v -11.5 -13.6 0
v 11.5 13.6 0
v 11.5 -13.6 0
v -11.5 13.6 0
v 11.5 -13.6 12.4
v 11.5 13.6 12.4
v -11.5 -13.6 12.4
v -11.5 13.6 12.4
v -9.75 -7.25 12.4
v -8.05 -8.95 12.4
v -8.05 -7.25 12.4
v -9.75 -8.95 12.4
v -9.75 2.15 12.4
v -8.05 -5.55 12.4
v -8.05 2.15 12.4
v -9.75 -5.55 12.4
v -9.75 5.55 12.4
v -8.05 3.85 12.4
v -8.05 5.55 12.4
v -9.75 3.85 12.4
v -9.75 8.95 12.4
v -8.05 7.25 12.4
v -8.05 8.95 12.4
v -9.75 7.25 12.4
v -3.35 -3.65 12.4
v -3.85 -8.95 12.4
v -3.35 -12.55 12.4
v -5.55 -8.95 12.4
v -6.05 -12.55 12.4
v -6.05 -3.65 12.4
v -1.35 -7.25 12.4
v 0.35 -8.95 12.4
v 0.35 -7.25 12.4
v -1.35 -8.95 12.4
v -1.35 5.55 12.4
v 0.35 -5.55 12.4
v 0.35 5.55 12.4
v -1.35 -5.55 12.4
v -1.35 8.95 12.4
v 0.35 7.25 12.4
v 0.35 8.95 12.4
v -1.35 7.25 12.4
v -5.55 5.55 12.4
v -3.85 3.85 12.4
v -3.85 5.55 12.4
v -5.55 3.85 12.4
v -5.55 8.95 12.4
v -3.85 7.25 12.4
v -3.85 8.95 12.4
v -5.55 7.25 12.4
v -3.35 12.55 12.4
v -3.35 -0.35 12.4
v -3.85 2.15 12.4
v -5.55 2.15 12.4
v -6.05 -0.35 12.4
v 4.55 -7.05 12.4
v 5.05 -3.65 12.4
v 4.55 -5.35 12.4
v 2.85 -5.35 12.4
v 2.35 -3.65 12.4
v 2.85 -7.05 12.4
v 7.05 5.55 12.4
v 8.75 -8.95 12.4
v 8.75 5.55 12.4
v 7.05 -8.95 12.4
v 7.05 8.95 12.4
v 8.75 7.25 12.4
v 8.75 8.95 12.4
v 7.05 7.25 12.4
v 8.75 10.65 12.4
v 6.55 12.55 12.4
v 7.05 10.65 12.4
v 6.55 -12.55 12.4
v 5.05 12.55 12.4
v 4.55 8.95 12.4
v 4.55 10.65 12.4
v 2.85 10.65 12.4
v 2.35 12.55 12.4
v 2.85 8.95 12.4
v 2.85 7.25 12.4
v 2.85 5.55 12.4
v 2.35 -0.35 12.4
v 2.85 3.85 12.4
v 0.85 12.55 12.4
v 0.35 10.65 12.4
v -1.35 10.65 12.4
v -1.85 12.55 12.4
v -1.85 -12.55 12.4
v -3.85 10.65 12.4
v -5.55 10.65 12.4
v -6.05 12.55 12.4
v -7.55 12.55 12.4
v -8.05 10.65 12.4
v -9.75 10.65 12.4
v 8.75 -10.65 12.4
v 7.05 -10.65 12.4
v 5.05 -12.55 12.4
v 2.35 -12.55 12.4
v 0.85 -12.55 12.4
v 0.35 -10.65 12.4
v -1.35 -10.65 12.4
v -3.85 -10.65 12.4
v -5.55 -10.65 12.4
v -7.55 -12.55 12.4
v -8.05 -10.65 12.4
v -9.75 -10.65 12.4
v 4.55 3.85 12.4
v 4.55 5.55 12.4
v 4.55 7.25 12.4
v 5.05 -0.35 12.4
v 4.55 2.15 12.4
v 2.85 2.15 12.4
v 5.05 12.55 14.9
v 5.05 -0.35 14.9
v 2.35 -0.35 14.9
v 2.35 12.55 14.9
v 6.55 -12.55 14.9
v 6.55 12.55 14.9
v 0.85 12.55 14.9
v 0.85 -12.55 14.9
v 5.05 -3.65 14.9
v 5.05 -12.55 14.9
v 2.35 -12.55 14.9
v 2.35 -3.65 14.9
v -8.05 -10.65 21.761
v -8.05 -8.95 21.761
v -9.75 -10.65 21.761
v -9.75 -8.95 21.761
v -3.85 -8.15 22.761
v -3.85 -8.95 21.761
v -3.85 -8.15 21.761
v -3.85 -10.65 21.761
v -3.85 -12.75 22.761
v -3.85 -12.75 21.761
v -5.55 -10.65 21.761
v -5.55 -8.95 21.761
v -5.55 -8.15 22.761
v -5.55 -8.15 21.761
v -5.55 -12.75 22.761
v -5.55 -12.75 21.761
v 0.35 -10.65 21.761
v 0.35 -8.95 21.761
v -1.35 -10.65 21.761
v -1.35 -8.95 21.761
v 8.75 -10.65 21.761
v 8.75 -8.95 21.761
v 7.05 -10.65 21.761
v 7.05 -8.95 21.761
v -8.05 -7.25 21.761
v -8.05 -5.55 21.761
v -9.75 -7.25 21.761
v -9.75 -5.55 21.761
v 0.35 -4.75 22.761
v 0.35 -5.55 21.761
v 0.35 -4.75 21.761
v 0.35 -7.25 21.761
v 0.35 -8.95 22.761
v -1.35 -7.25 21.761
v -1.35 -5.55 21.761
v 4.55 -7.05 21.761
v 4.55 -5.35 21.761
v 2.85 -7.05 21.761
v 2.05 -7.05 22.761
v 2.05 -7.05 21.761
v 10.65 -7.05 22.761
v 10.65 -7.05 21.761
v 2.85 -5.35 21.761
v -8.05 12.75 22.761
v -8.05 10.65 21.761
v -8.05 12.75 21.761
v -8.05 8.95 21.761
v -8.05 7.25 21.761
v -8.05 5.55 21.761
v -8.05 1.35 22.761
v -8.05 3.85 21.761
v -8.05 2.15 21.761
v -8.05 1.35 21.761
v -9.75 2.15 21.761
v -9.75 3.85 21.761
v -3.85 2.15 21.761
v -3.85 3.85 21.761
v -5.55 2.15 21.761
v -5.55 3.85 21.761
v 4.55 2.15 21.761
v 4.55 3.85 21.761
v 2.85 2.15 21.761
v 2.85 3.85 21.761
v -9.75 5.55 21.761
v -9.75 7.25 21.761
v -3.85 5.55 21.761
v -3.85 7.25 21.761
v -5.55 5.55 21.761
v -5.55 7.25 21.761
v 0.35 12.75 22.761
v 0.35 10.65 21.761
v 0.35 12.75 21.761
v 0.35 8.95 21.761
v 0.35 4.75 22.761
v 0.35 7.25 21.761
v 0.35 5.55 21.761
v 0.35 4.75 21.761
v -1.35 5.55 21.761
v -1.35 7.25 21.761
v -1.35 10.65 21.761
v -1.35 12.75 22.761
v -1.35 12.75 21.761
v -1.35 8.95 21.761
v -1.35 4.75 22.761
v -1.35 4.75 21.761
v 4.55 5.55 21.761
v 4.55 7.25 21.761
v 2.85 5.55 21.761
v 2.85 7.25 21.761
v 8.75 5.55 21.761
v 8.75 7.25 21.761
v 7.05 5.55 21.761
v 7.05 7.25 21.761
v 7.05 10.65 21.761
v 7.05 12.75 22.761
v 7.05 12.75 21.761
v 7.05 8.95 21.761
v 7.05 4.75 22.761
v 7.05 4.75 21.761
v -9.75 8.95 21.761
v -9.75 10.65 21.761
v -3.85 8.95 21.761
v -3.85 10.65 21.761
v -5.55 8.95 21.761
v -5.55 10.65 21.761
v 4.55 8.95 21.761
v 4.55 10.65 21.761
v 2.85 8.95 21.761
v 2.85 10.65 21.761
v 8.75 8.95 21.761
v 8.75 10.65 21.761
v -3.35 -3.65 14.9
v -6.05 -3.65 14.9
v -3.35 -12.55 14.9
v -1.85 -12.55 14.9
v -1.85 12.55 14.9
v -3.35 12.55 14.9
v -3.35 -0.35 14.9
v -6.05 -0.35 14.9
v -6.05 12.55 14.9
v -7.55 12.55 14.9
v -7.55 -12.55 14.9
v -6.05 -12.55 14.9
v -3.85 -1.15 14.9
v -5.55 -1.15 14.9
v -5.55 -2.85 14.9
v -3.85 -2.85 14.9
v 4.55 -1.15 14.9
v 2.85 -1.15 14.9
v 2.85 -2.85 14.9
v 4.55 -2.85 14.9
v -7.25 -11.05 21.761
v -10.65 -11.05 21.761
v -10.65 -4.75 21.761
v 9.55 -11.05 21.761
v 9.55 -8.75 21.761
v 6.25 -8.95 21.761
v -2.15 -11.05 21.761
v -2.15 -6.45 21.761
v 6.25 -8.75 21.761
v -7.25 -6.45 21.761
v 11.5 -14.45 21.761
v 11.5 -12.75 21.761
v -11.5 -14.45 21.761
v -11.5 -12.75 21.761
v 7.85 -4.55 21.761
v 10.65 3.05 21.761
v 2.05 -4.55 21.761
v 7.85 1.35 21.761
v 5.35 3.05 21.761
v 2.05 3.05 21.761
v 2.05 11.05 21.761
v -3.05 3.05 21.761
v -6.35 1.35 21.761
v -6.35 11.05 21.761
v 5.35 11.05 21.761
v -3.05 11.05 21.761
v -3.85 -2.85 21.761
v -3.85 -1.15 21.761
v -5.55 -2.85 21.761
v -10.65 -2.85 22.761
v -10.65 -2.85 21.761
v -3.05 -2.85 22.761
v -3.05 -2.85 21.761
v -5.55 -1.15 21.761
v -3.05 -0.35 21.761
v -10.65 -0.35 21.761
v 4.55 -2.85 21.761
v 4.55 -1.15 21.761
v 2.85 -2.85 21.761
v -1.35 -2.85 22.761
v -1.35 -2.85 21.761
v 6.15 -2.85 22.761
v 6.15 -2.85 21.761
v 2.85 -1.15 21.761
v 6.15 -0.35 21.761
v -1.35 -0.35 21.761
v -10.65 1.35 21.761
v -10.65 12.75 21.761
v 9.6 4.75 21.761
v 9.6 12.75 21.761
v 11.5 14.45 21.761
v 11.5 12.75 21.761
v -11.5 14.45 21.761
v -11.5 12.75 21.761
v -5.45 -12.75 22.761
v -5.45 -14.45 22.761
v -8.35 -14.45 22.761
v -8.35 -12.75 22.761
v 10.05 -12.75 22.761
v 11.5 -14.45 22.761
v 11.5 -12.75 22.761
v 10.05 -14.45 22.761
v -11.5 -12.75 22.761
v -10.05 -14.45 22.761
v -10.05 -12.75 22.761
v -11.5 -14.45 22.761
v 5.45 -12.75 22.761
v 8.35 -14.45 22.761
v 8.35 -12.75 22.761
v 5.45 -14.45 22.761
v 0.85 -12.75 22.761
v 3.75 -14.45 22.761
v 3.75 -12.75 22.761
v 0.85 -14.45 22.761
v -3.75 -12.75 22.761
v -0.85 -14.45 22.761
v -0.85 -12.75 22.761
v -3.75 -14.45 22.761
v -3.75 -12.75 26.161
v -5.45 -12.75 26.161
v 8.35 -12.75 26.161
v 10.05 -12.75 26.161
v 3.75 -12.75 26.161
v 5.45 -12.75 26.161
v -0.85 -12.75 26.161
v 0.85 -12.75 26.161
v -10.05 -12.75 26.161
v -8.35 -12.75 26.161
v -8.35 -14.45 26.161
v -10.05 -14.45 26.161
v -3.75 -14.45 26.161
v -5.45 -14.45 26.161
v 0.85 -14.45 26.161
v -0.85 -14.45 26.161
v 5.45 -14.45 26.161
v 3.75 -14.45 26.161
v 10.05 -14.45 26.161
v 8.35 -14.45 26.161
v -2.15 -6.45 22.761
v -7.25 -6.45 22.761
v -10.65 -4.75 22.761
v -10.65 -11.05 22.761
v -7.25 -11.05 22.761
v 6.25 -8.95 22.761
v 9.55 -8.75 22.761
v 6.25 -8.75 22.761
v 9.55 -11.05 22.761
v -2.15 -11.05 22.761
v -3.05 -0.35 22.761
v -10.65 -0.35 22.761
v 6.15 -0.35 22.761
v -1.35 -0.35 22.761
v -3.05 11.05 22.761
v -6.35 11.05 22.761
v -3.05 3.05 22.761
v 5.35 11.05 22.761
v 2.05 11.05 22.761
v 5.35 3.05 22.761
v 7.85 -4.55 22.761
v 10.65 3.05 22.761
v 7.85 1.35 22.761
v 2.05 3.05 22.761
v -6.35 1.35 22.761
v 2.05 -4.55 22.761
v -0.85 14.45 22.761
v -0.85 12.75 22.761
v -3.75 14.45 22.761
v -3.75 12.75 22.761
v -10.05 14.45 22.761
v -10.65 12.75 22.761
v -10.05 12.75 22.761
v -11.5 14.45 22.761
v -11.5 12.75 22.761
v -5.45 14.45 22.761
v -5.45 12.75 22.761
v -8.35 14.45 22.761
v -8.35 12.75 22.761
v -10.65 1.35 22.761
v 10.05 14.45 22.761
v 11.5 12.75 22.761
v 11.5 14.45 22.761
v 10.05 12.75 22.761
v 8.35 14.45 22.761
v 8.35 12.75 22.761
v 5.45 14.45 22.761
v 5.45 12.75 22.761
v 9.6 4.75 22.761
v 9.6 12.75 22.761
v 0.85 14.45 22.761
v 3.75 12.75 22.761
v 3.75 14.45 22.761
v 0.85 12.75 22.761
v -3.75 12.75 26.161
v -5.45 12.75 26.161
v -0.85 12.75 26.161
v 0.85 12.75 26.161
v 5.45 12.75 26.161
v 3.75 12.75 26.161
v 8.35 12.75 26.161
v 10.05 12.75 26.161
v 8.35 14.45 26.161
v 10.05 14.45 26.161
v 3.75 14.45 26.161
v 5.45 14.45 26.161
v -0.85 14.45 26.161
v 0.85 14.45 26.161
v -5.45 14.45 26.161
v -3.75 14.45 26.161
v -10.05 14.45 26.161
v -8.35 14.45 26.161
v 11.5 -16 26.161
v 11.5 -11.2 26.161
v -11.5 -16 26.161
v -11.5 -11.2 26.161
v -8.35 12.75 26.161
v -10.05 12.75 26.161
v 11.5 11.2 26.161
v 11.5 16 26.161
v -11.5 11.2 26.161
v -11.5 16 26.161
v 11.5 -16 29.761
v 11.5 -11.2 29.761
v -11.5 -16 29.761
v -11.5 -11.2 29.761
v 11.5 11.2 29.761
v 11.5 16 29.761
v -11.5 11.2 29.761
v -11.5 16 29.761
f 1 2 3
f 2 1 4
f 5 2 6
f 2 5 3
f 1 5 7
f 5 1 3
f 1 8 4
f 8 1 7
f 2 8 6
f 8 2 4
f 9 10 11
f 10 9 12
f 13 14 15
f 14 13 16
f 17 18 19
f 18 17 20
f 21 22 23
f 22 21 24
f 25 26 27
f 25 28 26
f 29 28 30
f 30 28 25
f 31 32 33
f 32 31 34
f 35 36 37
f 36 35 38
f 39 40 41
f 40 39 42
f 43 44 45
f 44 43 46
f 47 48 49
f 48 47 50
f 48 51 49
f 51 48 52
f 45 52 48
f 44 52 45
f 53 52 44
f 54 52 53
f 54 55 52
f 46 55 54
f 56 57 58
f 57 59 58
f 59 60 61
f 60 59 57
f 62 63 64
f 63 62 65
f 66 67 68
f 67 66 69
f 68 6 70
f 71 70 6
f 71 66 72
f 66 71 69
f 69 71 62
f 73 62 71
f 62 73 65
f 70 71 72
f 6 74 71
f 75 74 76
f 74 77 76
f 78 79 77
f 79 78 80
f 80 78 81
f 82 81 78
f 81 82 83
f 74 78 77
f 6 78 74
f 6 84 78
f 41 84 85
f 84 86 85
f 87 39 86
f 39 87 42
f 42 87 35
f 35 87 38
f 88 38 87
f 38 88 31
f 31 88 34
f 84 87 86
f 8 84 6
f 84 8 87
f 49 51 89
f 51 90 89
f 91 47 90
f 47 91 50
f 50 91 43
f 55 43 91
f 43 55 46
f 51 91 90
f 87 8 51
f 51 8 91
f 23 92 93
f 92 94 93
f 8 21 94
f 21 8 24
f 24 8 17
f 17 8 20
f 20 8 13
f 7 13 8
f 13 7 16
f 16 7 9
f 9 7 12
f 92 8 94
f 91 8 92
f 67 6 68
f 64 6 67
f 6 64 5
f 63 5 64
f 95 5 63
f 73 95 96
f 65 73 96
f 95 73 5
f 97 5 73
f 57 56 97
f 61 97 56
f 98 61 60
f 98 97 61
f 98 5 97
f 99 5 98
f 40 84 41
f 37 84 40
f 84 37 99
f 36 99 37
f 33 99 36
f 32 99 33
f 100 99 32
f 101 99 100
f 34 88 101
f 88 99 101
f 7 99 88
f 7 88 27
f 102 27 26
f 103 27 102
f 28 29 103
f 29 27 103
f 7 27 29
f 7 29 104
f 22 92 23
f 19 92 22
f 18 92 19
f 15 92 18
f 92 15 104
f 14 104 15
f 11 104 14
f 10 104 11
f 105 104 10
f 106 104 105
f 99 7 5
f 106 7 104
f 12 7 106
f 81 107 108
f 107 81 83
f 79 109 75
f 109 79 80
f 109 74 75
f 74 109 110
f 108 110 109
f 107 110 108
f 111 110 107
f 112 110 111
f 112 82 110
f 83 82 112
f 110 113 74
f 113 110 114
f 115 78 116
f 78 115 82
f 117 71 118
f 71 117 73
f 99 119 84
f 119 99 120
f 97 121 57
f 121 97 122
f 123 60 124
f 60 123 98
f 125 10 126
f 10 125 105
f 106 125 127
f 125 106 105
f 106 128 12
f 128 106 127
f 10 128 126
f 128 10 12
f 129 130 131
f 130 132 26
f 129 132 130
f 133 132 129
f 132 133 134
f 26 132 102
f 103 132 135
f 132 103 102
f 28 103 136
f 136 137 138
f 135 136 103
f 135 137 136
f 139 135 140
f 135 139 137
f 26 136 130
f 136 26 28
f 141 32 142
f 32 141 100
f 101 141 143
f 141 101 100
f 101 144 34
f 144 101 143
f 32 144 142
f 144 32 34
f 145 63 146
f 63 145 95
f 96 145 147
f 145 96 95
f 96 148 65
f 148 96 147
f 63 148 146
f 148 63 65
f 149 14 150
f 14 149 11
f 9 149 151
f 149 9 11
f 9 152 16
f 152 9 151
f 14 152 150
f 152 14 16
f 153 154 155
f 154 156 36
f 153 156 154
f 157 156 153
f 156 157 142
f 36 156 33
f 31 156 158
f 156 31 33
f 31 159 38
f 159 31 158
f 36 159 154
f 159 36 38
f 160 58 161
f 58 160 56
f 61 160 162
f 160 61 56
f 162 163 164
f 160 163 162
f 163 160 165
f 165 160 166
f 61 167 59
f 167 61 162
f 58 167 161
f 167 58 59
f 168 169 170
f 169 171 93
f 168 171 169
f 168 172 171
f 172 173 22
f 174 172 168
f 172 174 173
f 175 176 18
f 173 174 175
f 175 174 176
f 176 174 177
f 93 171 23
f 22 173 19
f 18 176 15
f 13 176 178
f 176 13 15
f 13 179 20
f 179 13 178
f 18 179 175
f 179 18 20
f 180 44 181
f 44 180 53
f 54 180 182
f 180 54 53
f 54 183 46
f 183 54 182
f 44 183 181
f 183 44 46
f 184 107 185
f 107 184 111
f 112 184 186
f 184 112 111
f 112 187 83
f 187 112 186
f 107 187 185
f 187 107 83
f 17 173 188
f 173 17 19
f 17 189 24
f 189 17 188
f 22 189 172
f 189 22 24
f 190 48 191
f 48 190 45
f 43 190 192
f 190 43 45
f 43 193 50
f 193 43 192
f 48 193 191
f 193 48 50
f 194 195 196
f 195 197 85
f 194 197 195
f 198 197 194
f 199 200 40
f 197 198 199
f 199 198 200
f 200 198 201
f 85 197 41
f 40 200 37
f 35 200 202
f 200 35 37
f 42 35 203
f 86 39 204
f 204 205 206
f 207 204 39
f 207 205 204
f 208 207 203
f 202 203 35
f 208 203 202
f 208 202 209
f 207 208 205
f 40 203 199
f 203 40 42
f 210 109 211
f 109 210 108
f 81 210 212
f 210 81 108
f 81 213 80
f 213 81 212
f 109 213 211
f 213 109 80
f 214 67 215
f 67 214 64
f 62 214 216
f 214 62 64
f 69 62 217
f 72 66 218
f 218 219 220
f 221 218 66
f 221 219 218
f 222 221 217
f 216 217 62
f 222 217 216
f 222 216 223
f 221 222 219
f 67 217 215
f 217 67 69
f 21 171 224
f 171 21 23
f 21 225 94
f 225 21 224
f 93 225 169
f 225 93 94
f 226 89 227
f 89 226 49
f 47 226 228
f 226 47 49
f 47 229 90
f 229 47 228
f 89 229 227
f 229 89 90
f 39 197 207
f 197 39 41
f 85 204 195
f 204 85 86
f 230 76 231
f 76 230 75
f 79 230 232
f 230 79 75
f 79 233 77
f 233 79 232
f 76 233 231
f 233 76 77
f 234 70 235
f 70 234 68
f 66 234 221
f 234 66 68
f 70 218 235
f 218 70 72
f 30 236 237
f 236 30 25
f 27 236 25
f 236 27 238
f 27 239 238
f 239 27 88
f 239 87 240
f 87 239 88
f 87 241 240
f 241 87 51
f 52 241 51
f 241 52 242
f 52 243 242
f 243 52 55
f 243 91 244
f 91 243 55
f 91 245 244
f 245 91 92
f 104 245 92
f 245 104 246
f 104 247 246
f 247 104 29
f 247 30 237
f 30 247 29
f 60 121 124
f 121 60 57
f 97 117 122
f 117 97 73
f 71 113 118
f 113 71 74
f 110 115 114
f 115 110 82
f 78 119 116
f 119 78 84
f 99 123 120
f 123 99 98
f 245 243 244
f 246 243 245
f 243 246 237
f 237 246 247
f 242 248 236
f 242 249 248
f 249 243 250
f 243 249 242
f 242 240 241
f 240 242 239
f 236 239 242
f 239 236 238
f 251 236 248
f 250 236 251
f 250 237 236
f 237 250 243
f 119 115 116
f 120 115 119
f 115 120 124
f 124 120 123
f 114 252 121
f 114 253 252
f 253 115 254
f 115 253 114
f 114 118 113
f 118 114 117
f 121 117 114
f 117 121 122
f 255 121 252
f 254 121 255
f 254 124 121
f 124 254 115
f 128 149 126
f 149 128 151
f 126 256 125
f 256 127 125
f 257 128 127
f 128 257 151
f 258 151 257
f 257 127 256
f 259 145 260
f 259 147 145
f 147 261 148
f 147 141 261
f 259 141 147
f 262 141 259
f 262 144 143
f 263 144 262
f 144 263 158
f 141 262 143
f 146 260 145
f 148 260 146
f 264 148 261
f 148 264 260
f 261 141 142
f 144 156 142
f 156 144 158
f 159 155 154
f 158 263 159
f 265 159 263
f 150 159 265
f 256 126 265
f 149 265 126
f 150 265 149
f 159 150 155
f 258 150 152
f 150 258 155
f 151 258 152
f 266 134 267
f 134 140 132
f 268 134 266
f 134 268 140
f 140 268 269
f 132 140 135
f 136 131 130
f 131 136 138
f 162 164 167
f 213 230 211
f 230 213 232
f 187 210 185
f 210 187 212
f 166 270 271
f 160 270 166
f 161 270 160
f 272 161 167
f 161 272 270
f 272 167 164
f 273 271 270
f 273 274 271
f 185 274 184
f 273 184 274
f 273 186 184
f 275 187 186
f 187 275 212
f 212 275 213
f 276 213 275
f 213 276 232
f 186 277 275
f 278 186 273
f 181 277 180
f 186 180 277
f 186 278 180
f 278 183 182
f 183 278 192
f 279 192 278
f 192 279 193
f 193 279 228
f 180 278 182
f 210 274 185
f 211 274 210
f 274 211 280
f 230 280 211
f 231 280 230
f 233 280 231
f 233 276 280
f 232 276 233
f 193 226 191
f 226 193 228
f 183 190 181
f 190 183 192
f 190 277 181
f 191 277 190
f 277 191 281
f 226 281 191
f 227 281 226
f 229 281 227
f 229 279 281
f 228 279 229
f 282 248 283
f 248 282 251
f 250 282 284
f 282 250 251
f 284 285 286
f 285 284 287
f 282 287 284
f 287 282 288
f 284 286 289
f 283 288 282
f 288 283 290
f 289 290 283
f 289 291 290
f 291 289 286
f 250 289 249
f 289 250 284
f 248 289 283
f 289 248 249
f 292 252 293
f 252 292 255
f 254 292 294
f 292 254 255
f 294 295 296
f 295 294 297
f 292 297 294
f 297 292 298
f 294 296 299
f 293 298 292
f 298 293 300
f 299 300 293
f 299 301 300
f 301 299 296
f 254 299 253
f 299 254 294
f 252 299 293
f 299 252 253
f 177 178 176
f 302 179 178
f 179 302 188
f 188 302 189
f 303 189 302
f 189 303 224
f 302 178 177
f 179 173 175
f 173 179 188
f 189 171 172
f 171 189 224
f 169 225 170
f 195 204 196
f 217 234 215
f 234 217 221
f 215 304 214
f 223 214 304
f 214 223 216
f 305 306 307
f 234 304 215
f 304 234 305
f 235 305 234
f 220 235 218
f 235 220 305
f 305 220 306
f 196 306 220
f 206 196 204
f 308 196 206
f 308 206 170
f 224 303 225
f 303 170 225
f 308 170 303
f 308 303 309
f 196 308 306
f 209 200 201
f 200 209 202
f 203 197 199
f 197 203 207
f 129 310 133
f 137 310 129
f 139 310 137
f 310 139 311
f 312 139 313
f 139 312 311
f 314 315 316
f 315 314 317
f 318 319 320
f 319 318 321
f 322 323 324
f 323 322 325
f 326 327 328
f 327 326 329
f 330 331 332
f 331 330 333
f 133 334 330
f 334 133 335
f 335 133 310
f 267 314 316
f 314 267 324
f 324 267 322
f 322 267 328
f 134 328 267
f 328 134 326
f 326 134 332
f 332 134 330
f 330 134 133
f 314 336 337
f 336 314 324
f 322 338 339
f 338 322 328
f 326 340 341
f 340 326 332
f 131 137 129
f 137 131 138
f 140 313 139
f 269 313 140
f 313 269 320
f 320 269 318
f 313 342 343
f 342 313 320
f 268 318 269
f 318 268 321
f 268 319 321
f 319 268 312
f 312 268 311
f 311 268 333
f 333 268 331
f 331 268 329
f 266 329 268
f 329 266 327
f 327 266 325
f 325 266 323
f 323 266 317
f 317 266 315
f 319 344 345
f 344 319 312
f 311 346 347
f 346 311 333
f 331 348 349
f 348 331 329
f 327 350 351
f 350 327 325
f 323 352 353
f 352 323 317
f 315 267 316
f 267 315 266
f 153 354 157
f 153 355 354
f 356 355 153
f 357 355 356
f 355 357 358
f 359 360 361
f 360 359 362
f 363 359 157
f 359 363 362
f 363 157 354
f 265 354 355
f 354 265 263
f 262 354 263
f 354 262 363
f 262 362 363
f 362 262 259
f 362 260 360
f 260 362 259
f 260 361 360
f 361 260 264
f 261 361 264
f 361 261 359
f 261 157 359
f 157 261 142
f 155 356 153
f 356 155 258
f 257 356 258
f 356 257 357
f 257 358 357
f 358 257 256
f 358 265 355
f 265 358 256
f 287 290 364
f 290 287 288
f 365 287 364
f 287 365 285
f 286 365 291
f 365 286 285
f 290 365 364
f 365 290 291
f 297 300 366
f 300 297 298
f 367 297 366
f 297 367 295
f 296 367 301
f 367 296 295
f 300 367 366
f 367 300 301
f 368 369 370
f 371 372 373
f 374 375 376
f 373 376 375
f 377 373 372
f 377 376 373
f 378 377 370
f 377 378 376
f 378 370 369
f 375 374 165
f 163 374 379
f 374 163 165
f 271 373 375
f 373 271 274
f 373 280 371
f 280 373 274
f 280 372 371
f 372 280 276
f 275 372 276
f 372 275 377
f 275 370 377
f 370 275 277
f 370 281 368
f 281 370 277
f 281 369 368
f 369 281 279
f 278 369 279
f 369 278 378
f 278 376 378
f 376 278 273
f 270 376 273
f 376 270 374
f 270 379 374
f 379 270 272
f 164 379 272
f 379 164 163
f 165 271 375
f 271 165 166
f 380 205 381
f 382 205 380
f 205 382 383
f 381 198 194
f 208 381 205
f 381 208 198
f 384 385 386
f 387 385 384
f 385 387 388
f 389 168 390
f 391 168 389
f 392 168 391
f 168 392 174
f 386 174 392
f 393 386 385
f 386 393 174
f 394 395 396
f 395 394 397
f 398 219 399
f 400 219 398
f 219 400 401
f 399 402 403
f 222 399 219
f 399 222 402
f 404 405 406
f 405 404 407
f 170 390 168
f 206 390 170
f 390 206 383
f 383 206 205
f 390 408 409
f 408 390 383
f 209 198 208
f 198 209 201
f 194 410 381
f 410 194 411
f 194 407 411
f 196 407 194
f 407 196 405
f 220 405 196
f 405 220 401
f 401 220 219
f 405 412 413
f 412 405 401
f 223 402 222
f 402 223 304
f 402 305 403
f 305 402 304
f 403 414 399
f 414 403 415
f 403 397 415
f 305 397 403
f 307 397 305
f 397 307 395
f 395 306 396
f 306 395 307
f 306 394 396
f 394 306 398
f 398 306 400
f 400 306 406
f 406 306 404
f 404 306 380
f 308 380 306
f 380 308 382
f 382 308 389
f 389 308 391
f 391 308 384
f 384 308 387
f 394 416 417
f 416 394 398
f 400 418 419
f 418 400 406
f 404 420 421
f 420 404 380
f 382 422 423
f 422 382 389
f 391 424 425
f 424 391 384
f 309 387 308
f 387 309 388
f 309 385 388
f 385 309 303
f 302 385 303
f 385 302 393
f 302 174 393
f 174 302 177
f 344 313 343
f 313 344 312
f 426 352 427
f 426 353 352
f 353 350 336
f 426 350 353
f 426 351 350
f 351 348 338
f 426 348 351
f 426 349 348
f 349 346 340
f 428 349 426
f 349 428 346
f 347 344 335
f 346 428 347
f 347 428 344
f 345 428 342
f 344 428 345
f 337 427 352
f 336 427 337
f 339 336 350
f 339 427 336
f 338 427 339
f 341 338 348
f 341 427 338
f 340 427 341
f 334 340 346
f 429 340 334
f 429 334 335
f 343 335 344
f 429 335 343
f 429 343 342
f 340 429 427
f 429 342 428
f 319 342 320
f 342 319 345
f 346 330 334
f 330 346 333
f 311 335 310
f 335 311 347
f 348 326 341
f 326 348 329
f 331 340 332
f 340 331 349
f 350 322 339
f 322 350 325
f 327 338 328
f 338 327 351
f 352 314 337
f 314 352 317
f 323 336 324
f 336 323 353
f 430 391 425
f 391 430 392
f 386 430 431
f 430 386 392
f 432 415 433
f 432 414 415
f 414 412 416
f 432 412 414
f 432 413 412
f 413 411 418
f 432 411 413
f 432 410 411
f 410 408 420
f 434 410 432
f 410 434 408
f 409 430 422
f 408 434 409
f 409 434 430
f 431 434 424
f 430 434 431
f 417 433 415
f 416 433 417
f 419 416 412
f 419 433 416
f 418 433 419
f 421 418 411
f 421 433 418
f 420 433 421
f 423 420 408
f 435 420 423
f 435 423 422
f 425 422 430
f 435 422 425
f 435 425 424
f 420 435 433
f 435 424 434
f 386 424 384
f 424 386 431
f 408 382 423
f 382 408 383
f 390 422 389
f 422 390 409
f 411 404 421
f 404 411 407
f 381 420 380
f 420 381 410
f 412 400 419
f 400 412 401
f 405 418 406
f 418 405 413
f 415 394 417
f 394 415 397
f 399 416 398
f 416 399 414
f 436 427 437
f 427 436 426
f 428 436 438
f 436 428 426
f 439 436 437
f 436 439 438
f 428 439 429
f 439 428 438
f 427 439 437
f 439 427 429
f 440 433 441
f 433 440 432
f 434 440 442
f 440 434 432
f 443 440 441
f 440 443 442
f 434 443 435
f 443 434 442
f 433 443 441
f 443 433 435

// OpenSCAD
// Generated by SolidPython 0.4.2 on 2020-09-29 23:21:22
//!OpenSCAD

scale(v = 0.0100000000) {
	translate(v = [-1150, -1360, 0]) {
		union() {
			color(c = [0.4000000000, 0.4000000000, 0.4000000000]) {
				translate(v = [0, 0, 0]) {
					linear_extrude(height = 1000.0000000000) {
						polygon(paths = [[0, 1, 2, 3]], points = [[0, 0], [0, 2720], [2300, 2720], [2300, 0]]);
					}
				}
			}
			color(c = [0.2000000000, 0.6000000000, 0.2000000000]) {
				translate(v = [0, 0, 1000.0000000000]) {
					linear_extrude(height = 120.0000000000) {
						polygon(paths = [[0, 1, 2, 3]], points = [[0, 1305], [0, 2720], [2300, 2720], [2300, 1305]]);
					}
				}
			}
			color(c = [0.4000000000, 0.4000000000, 0.4000000000]) {
				translate(v = [0, 0, 1000.0000000000]) {
					linear_extrude(height = 120.0000000000) {
						polygon(paths = [[0, 1, 2, 3]], points = [[0, 0], [0, 1305], [2300, 1305], [2300, 0]]);
					}
				}
			}
			color(c = [0.9000000000, 0.6000000000, 0.6000000000]) {
				translate(v = [0, 0, 1120.0000000000]) {
					linear_extrude(height = 120.0000000000) {
						polygon(paths = [[0, 1, 2, 3]], points = [[135, 1485], [135, 2485], [395, 2485], [395, 1485]]);
					}
				}
			}
			color(c = [0.9000000000, 0.6000000000, 0.6000000000]) {
				translate(v = [0, 0, 1120.0000000000]) {
					linear_extrude(height = 120.0000000000) {
						polygon(paths = [[0, 1, 2, 3]], points = [[545, 1485], [545, 2485], [815, 2485], [815, 1485]]);
					}
				}
			}
			color(c = [0.9000000000, 0.6000000000, 0.6000000000]) {
				translate(v = [0, 0, 1120.0000000000]) {
					linear_extrude(height = 120.0000000000) {
						polygon(paths = [[0, 1, 2, 3]], points = [[965, 1485], [965, 2485], [1235, 2485], [1235, 1485]]);
					}
				}
			}
			color(c = [0.9000000000, 0.6000000000, 0.6000000000]) {
				translate(v = [0, 0, 1120.0000000000]) {
					linear_extrude(height = 120.0000000000) {
						polygon(paths = [[0, 1, 2, 3]], points = [[1385, 1485], [1385, 2485], [1655, 2485], [1655, 1485]]);
					}
				}
			}
			color(c = [0.9000000000, 0.6000000000, 0.6000000000]) {
				translate(v = [0, 0, 1120.0000000000]) {
					linear_extrude(height = 120.0000000000) {
						polygon(paths = [[0, 1, 2, 3]], points = [[1805, 1485], [1805, 2485], [2065, 2485], [2065, 1485]]);
					}
				}
			}
			color(c = [0.9000000000, 0.6000000000, 0.9000000000]) {
				translate(v = [0, 0, 1120.0000000000]) {
					linear_extrude(height = 120.0000000000) {
						polygon(paths = [[0, 1, 2, 3]], points = [[135, 235], [135, 885], [395, 885], [395, 235]]);
					}
				}
			}
			color(c = [0.9000000000, 0.6000000000, 0.9000000000]) {
				translate(v = [0, 0, 1120.0000000000]) {
					linear_extrude(height = 120.0000000000) {
						polygon(paths = [[0, 1, 2, 3]], points = [[545, 235], [545, 885], [815, 885], [815, 235]]);
					}
				}
			}
			color(c = [0.9000000000, 0.6000000000, 0.9000000000]) {
				translate(v = [0, 0, 1120.0000000000]) {
					linear_extrude(height = 120.0000000000) {
						polygon(paths = [[0, 1, 2, 3]], points = [[965, 235], [965, 885], [1235, 885], [1235, 235]]);
					}
				}
			}
			color(c = [0.9000000000, 0.6000000000, 0.9000000000]) {
				translate(v = [0, 0, 1120.0000000000]) {
					linear_extrude(height = 120.0000000000) {
						polygon(paths = [[0, 1, 2, 3]], points = [[1385, 235], [1385, 885], [1655, 885], [1655, 235]]);
					}
				}
			}
			color(c = [0.9000000000, 0.6000000000, 0.9000000000]) {
				translate(v = [0, 0, 1120.0000000000]) {
					linear_extrude(height = 120.0000000000) {
						polygon(paths = [[0, 1, 2, 3]], points = [[1805, 235], [1805, 885], [2065, 885], [2065, 235]]);
					}
				}
			}
			color(c = [0.2000000000, 0.6000000000, 0.2000000000]) {
				translate(v = [0, 0, 1120.0000000000]) {
					linear_extrude(height = 120.0000000000) {
						difference() {
							polygon(paths = [[0, 1, 2, 3]], points = [[0, 1305], [0, 2720], [2300, 2720], [2300, 1305]]);
							polygon(paths = [[0, 1, 2, 3]], points = [[135, 1485], [395, 1485], [395, 2485], [135, 2485]]);
							polygon(paths = [[0, 1, 2, 3]], points = [[545, 1485], [815, 1485], [815, 2485], [545, 2485]]);
							polygon(paths = [[0, 1, 2, 3]], points = [[965, 1485], [1235, 1485], [1235, 2485], [965, 2485]]);
							polygon(paths = [[0, 1, 2, 3]], points = [[1385, 1485], [1655, 1485], [1655, 2485], [1385, 2485]]);
							polygon(paths = [[0, 1, 2, 3]], points = [[1805, 1485], [2065, 1485], [2065, 2485], [1805, 2485]]);
						}
					}
				}
			}
			color(c = [0.4000000000, 0.4000000000, 0.4000000000]) {
				translate(v = [0, 0, 1120.0000000000]) {
					linear_extrude(height = 120.0000000000) {
						difference() {
							polygon(paths = [[0, 1, 2, 3]], points = [[0, 0], [0, 1305], [2300, 1305], [2300, 0]]);
							polygon(paths = [[0, 1, 2, 3]], points = [[135, 235], [395, 235], [395, 885], [135, 885]]);
							polygon(paths = [[0, 1, 2, 3]], points = [[545, 235], [815, 235], [815, 885], [545, 885]]);
							polygon(paths = [[0, 1, 2, 3]], points = [[965, 235], [1235, 235], [1235, 885], [965, 885]]);
							polygon(paths = [[0, 1, 2, 3]], points = [[1385, 235], [1655, 235], [1655, 885], [1385, 885]]);
							polygon(paths = [[0, 1, 2, 3]], points = [[1805, 235], [2065, 235], [2065, 885], [1805, 885]]);
						}
					}
				}
			}
			color(c = [0.1000000000, 0.1000000000, 0.1000000000]) {
				translate(v = [0, 0, 1240.0000000000]) {
					linear_extrude(height = 70.0000000000) {
						polygon(paths = [[0, 1, 2, 3]], points = [[175, 295], [175, 465], [345, 465], [345, 295]]);
					}
				}
			}
			color(c = [0.1000000000, 0.1000000000, 0.1000000000]) {
				translate(v = [0, 0, 1240.0000000000]) {
					linear_extrude(height = 70.0000000000) {
						polygon(paths = [[0, 1, 2, 3]], points = [[595, 295], [595, 465], [765, 465], [765, 295]]);
					}
				}
			}
			color(c = [0.1000000000, 0.1000000000, 0.1000000000]) {
				translate(v = [0, 0, 1240.0000000000]) {
					linear_extrude(height = 70.0000000000) {
						polygon(paths = [[0, 1, 2, 3]], points = [[1015, 295], [1015, 465], [1185, 465], [1185, 295]]);
					}
				}
			}
			color(c = [0.1000000000, 0.1000000000, 0.1000000000]) {
				translate(v = [0, 0, 1240.0000000000]) {
					linear_extrude(height = 70.0000000000) {
						polygon(paths = [[0, 1, 2, 3]], points = [[1855, 295], [1855, 465], [2025, 465], [2025, 295]]);
					}
				}
			}
			color(c = [0.1000000000, 0.1000000000, 0.1000000000]) {
				translate(v = [0, 0, 1240.0000000000]) {
					linear_extrude(height = 70.0000000000) {
						polygon(paths = [[0, 1, 2, 3]], points = [[175, 635], [175, 805], [345, 805], [345, 635]]);
					}
				}
			}
			color(c = [0.1000000000, 0.1000000000, 0.1000000000]) {
				translate(v = [0, 0, 1240.0000000000]) {
					linear_extrude(height = 70.0000000000) {
						polygon(paths = [[0, 1, 2, 3]], points = [[1015, 635], [1015, 805], [1185, 805], [1185, 635]]);
					}
				}
			}
			color(c = [0.1000000000, 0.1000000000, 0.1000000000]) {
				translate(v = [0, 0, 1240.0000000000]) {
					linear_extrude(height = 70.0000000000) {
						polygon(paths = [[0, 1, 2, 3]], points = [[1435, 655], [1435, 825], [1605, 825], [1605, 655]]);
					}
				}
			}
			color(c = [0.1000000000, 0.1000000000, 0.1000000000]) {
				translate(v = [0, 0, 1240.0000000000]) {
					linear_extrude(height = 70.0000000000) {
						polygon(paths = [[0, 1, 2, 3]], points = [[175, 1575], [175, 1745], [345, 1745], [345, 1575]]);
					}
				}
			}
			color(c = [0.1000000000, 0.1000000000, 0.1000000000]) {
				translate(v = [0, 0, 1240.0000000000]) {
					linear_extrude(height = 70.0000000000) {
						polygon(paths = [[0, 1, 2, 3]], points = [[595, 1575], [595, 1745], [765, 1745], [765, 1575]]);
					}
				}
			}
			color(c = [0.1000000000, 0.1000000000, 0.1000000000]) {
				translate(v = [0, 0, 1240.0000000000]) {
					linear_extrude(height = 70.0000000000) {
						polygon(paths = [[0, 1, 2, 3]], points = [[1435, 1575], [1435, 1745], [1605, 1745], [1605, 1575]]);
					}
				}
			}
			color(c = [0.1000000000, 0.1000000000, 0.1000000000]) {
				translate(v = [0, 0, 1240.0000000000]) {
					linear_extrude(height = 70.0000000000) {
						polygon(paths = [[0, 1, 2, 3]], points = [[175, 1915], [175, 2085], [345, 2085], [345, 1915]]);
					}
				}
			}
			color(c = [0.1000000000, 0.1000000000, 0.1000000000]) {
				translate(v = [0, 0, 1240.0000000000]) {
					linear_extrude(height = 70.0000000000) {
						polygon(paths = [[0, 1, 2, 3]], points = [[595, 1915], [595, 2085], [765, 2085], [765, 1915]]);
					}
				}
			}
			color(c = [0.1000000000, 0.1000000000, 0.1000000000]) {
				translate(v = [0, 0, 1240.0000000000]) {
					linear_extrude(height = 70.0000000000) {
						polygon(paths = [[0, 1, 2, 3]], points = [[1015, 1915], [1015, 2085], [1185, 2085], [1185, 1915]]);
					}
				}
			}
			color(c = [0.1000000000, 0.1000000000, 0.1000000000]) {
				translate(v = [0, 0, 1240.0000000000]) {
					linear_extrude(height = 70.0000000000) {
						polygon(paths = [[0, 1, 2, 3]], points = [[1435, 1915], [1435, 2085], [1605, 2085], [1605, 1915]]);
					}
				}
			}
			color(c = [0.1000000000, 0.1000000000, 0.1000000000]) {
				translate(v = [0, 0, 1240.0000000000]) {
					linear_extrude(height = 70.0000000000) {
						polygon(paths = [[0, 1, 2, 3]], points = [[1855, 1915], [1855, 2085], [2025, 2085], [2025, 1915]]);
					}
				}
			}
			color(c = [0.1000000000, 0.1000000000, 0.1000000000]) {
				translate(v = [0, 0, 1240.0000000000]) {
					linear_extrude(height = 70.0000000000) {
						polygon(paths = [[0, 1, 2, 3]], points = [[175, 2255], [175, 2425], [345, 2425], [345, 2255]]);
					}
				}
			}
			color(c = [0.1000000000, 0.1000000000, 0.1000000000]) {
				translate(v = [0, 0, 1240.0000000000]) {
					linear_extrude(height = 70.0000000000) {
						polygon(paths = [[0, 1, 2, 3]], points = [[595, 2255], [595, 2425], [765, 2425], [765, 2255]]);
					}
				}
			}
			color(c = [0.1000000000, 0.1000000000, 0.1000000000]) {
				translate(v = [0, 0, 1240.0000000000]) {
					linear_extrude(height = 70.0000000000) {
						polygon(paths = [[0, 1, 2, 3]], points = [[1015, 2255], [1015, 2425], [1185, 2425], [1185, 2255]]);
					}
				}
			}
			color(c = [0.1000000000, 0.1000000000, 0.1000000000]) {
				translate(v = [0, 0, 1240.0000000000]) {
					linear_extrude(height = 70.0000000000) {
						polygon(paths = [[0, 1, 2, 3]], points = [[1435, 2255], [1435, 2425], [1605, 2425], [1605, 2255]]);
					}
				}
			}
			color(c = [0.1000000000, 0.1000000000, 0.1000000000]) {
				translate(v = [0, 0, 1240.0000000000]) {
					linear_extrude(height = 70.0000000000) {
						polygon(paths = [[0, 1, 2, 3]], points = [[1855, 2255], [1855, 2425], [2025, 2425], [2025, 2255]]);
					}
				}
			}
			color(c = [1.0000000000, 1.0000000000, 1.0000000000]) {
				translate(v = [0, 0, 1240.0000000000]) {
					linear_extrude(height = 70.0000000000) {
						polygon(paths = [[0, 1, 2, 3, 4, 5, 6, 7, 8, 9, 10, 11]], points = [[395, 105], [395, 2615], [545, 2615], [545, 1325], [815, 1325], [815, 2615], [965, 2615], [965, 105], [815, 105], [815, 995], [545, 995], [545, 105]]);
					}
				}
			}
			color(c = [1.0000000000, 1.0000000000, 1.0000000000]) {
				translate(v = [0, 0, 1240.0000000000]) {
					linear_extrude(height = 70.0000000000) {
						polygon(paths = [[0, 1, 2, 3, 4, 5, 6, 7, 8, 9, 10, 11]], points = [[1235, 105], [1235, 2615], [1385, 2615], [1385, 1325], [1655, 1325], [1655, 2615], [1805, 2615], [1805, 105], [1655, 105], [1655, 995], [1385, 995], [1385, 105]]);
					}
				}
			}
			color(c = [0.1000000000, 0.1000000000, 0.1000000000]) {
				translate(v = [0, 0, 1310.0000000000]) {
					linear_extrude(height = 180.0000000000) {
						polygon(paths = [[0, 1, 2, 3]], points = [[175, 295], [175, 465], [345, 465], [345, 295]]);
					}
				}
			}
			color(c = [0.1000000000, 0.1000000000, 0.1000000000]) {
				translate(v = [0, 0, 1310.0000000000]) {
					linear_extrude(height = 180.0000000000) {
						polygon(paths = [[0, 1, 2, 3]], points = [[595, 295], [595, 465], [765, 465], [765, 295]]);
					}
				}
			}
			color(c = [0.1000000000, 0.1000000000, 0.1000000000]) {
				translate(v = [0, 0, 1310.0000000000]) {
					linear_extrude(height = 180.0000000000) {
						polygon(paths = [[0, 1, 2, 3]], points = [[1015, 295], [1015, 465], [1185, 465], [1185, 295]]);
					}
				}
			}
			color(c = [0.1000000000, 0.1000000000, 0.1000000000]) {
				translate(v = [0, 0, 1310.0000000000]) {
					linear_extrude(height = 180.0000000000) {
						polygon(paths = [[0, 1, 2, 3]], points = [[1855, 295], [1855, 465], [2025, 465], [2025, 295]]);
					}
				}
			}
			color(c = [0.1000000000, 0.1000000000, 0.1000000000]) {
				translate(v = [0, 0, 1310.0000000000]) {
					linear_extrude(height = 180.0000000000) {
						polygon(paths = [[0, 1, 2, 3]], points = [[175, 635], [175, 805], [345, 805], [345, 635]]);
					}
				}
			}
			color(c = [0.1000000000, 0.1000000000, 0.1000000000]) {
				translate(v = [0, 0, 1310.0000000000]) {
					linear_extrude(height = 180.0000000000) {
						polygon(paths = [[0, 1, 2, 3]], points = [[1015, 635], [1015, 805], [1185, 805], [1185, 635]]);
					}
				}
			}
			color(c = [0.1000000000, 0.1000000000, 0.1000000000]) {
				translate(v = [0, 0, 1310.0000000000]) {
					linear_extrude(height = 180.0000000000) {
						polygon(paths = [[0, 1, 2, 3]], points = [[1435, 655], [1435, 825], [1605, 825], [1605, 655]]);
					}
				}
			}
			color(c = [0.1000000000, 0.1000000000, 0.1000000000]) {
				translate(v = [0, 0, 1310.0000000000]) {
					linear_extrude(height = 180.0000000000) {
						polygon(paths = [[0, 1, 2, 3]], points = [[175, 1575], [175, 1745], [345, 1745], [345, 1575]]);
					}
				}
			}
			color(c = [0.1000000000, 0.1000000000, 0.1000000000]) {
				translate(v = [0, 0, 1310.0000000000]) {
					linear_extrude(height = 180.0000000000) {
						polygon(paths = [[0, 1, 2, 3]], points = [[595, 1575], [595, 1745], [765, 1745], [765, 1575]]);
					}
				}
			}
			color(c = [0.1000000000, 0.1000000000, 0.1000000000]) {
				translate(v = [0, 0, 1310.0000000000]) {
					linear_extrude(height = 180.0000000000) {
						polygon(paths = [[0, 1, 2, 3]], points = [[1435, 1575], [1435, 1745], [1605, 1745], [1605, 1575]]);
					}
				}
			}
			color(c = [0.1000000000, 0.1000000000, 0.1000000000]) {
				translate(v = [0, 0, 1310.0000000000]) {
					linear_extrude(height = 180.0000000000) {
						polygon(paths = [[0, 1, 2, 3]], points = [[175, 1915], [175, 2085], [345, 2085], [345, 1915]]);
					}
				}
			}
			color(c = [0.1000000000, 0.1000000000, 0.1000000000]) {
				translate(v = [0, 0, 1310.0000000000]) {
					linear_extrude(height = 180.0000000000) {
						polygon(paths = [[0, 1, 2, 3]], points = [[595, 1915], [595, 2085], [765, 2085], [765, 1915]]);
					}
				}
			}
			color(c = [0.1000000000, 0.1000000000, 0.1000000000]) {
				translate(v = [0, 0, 1310.0000000000]) {
					linear_extrude(height = 180.0000000000) {
						polygon(paths = [[0, 1, 2, 3]], points = [[1015, 1915], [1015, 2085], [1185, 2085], [1185, 1915]]);
					}
				}
			}
			color(c = [0.1000000000, 0.1000000000, 0.1000000000]) {
				translate(v = [0, 0, 1310.0000000000]) {
					linear_extrude(height = 180.0000000000) {
						polygon(paths = [[0, 1, 2, 3]], points = [[1435, 1915], [1435, 2085], [1605, 2085], [1605, 1915]]);
					}
				}
			}
			color(c = [0.1000000000, 0.1000000000, 0.1000000000]) {
				translate(v = [0, 0, 1310.0000000000]) {
					linear_extrude(height = 180.0000000000) {
						polygon(paths = [[0, 1, 2, 3]], points = [[1855, 1915], [1855, 2085], [2025, 2085], [2025, 1915]]);
					}
				}
			}
			color(c = [0.1000000000, 0.1000000000, 0.1000000000]) {
				translate(v = [0, 0, 1310.0000000000]) {
					linear_extrude(height = 180.0000000000) {
						polygon(paths = [[0, 1, 2, 3]], points = [[175, 2255], [175, 2425], [345, 2425], [345, 2255]]);
					}
				}
			}
			color(c = [0.1000000000, 0.1000000000, 0.1000000000]) {
				translate(v = [0, 0, 1310.0000000000]) {
					linear_extrude(height = 180.0000000000) {
						polygon(paths = [[0, 1, 2, 3]], points = [[595, 2255], [595, 2425], [765, 2425], [765, 2255]]);
					}
				}
			}
			color(c = [0.1000000000, 0.1000000000, 0.1000000000]) {
				translate(v = [0, 0, 1310.0000000000]) {
					linear_extrude(height = 180.0000000000) {
						polygon(paths = [[0, 1, 2, 3]], points = [[1015, 2255], [1015, 2425], [1185, 2425], [1185, 2255]]);
					}
				}
			}
			color(c = [0.1000000000, 0.1000000000, 0.1000000000]) {
				translate(v = [0, 0, 1310.0000000000]) {
					linear_extrude(height = 180.0000000000) {
						polygon(paths = [[0, 1, 2, 3]], points = [[1435, 2255], [1435, 2425], [1605, 2425], [1605, 2255]]);
					}
				}
			}
			color(c = [0.1000000000, 0.1000000000, 0.1000000000]) {
				translate(v = [0, 0, 1310.0000000000]) {
					linear_extrude(height = 180.0000000000) {
						polygon(paths = [[0, 1, 2, 3]], points = [[1855, 2255], [1855, 2425], [2025, 2425], [2025, 2255]]);
					}
				}
			}
			color(c = [0.7000000000, 0, 0]) {
				translate(v = [0, 0, 1310.0000000000]) {
					linear_extrude(height = 180.0000000000) {
						polygon(paths = [[0, 1, 2, 3, 4, 5, 6, 7, 8, 9, 10, 11]], points = [[395, 105], [395, 2615], [545, 2615], [545, 1325], [815, 1325], [815, 2615], [965, 2615], [965, 105], [815, 105], [815, 995], [545, 995], [545, 105]]);
					}
				}
			}
			color(c = [0.7000000000, 0, 0]) {
				translate(v = [0, 0, 1310.0000000000]) {
					linear_extrude(height = 180.0000000000) {
						polygon(paths = [[0, 1, 2, 3, 4, 5, 6, 7, 8, 9, 10, 11]], points = [[1235, 105], [1235, 2615], [1385, 2615], [1385, 1325], [1655, 1325], [1655, 2615], [1805, 2615], [1805, 105], [1655, 105], [1655, 995], [1385, 995], [1385, 105]]);
					}
				}
			}
			color(c = [0.1000000000, 0.1000000000, 0.1000000000]) {
				translate(v = [0, 0, 1490.0000000000]) {
					linear_extrude(height = 686.1000000000) {
						polygon(paths = [[0, 1, 2, 3]], points = [[175, 295], [175, 465], [345, 465], [345, 295]]);
					}
				}
			}
			color(c = [0.1000000000, 0.1000000000, 0.1000000000]) {
				translate(v = [0, 0, 1490.0000000000]) {
					linear_extrude(height = 686.1000000000) {
						polygon(paths = [[0, 1, 2, 3]], points = [[595, 295], [595, 465], [765, 465], [765, 295]]);
					}
				}
			}
			color(c = [0.1000000000, 0.1000000000, 0.1000000000]) {
				translate(v = [0, 0, 1490.0000000000]) {
					linear_extrude(height = 686.1000000000) {
						polygon(paths = [[0, 1, 2, 3]], points = [[1015, 295], [1015, 465], [1185, 465], [1185, 295]]);
					}
				}
			}
			color(c = [0.1000000000, 0.1000000000, 0.1000000000]) {
				translate(v = [0, 0, 1490.0000000000]) {
					linear_extrude(height = 686.1000000000) {
						polygon(paths = [[0, 1, 2, 3]], points = [[1855, 295], [1855, 465], [2025, 465], [2025, 295]]);
					}
				}
			}
			color(c = [0.1000000000, 0.1000000000, 0.1000000000]) {
				translate(v = [0, 0, 1490.0000000000]) {
					linear_extrude(height = 686.1000000000) {
						polygon(paths = [[0, 1, 2, 3]], points = [[175, 635], [175, 805], [345, 805], [345, 635]]);
					}
				}
			}
			color(c = [0.1000000000, 0.1000000000, 0.1000000000]) {
				translate(v = [0, 0, 1490.0000000000]) {
					linear_extrude(height = 686.1000000000) {
						polygon(paths = [[0, 1, 2, 3]], points = [[1015, 635], [1015, 805], [1185, 805], [1185, 635]]);
					}
				}
			}
			color(c = [0.1000000000, 0.1000000000, 0.1000000000]) {
				translate(v = [0, 0, 1490.0000000000]) {
					linear_extrude(height = 686.1000000000) {
						polygon(paths = [[0, 1, 2, 3]], points = [[1435, 655], [1435, 825], [1605, 825], [1605, 655]]);
					}
				}
			}
			color(c = [0.1000000000, 0.1000000000, 0.1000000000]) {
				translate(v = [0, 0, 1490.0000000000]) {
					linear_extrude(height = 686.1000000000) {
						polygon(paths = [[0, 1, 2, 3]], points = [[595, 1075], [595, 1245], [765, 1245], [765, 1075]]);
					}
				}
			}
			color(c = [0.1000000000, 0.1000000000, 0.1000000000]) {
				translate(v = [0, 0, 1490.0000000000]) {
					linear_extrude(height = 686.1000000000) {
						polygon(paths = [[0, 1, 2, 3]], points = [[1435, 1075], [1435, 1245], [1605, 1245], [1605, 1075]]);
					}
				}
			}
			color(c = [0.1000000000, 0.1000000000, 0.1000000000]) {
				translate(v = [0, 0, 1490.0000000000]) {
					linear_extrude(height = 686.1000000000) {
						polygon(paths = [[0, 1, 2, 3]], points = [[175, 1575], [175, 1745], [345, 1745], [345, 1575]]);
					}
				}
			}
			color(c = [0.1000000000, 0.1000000000, 0.1000000000]) {
				translate(v = [0, 0, 1490.0000000000]) {
					linear_extrude(height = 686.1000000000) {
						polygon(paths = [[0, 1, 2, 3]], points = [[595, 1575], [595, 1745], [765, 1745], [765, 1575]]);
					}
				}
			}
			color(c = [0.1000000000, 0.1000000000, 0.1000000000]) {
				translate(v = [0, 0, 1490.0000000000]) {
					linear_extrude(height = 686.1000000000) {
						polygon(paths = [[0, 1, 2, 3]], points = [[1435, 1575], [1435, 1745], [1605, 1745], [1605, 1575]]);
					}
				}
			}
			color(c = [0.1000000000, 0.1000000000, 0.1000000000]) {
				translate(v = [0, 0, 1490.0000000000]) {
					linear_extrude(height = 686.1000000000) {
						polygon(paths = [[0, 1, 2, 3]], points = [[175, 1915], [175, 2085], [345, 2085], [345, 1915]]);
					}
				}
			}
			color(c = [0.1000000000, 0.1000000000, 0.1000000000]) {
				translate(v = [0, 0, 1490.0000000000]) {
					linear_extrude(height = 686.1000000000) {
						polygon(paths = [[0, 1, 2, 3]], points = [[595, 1915], [595, 2085], [765, 2085], [765, 1915]]);
					}
				}
			}
			color(c = [0.1000000000, 0.1000000000, 0.1000000000]) {
				translate(v = [0, 0, 1490.0000000000]) {
					linear_extrude(height = 686.1000000000) {
						polygon(paths = [[0, 1, 2, 3]], points = [[1015, 1915], [1015, 2085], [1185, 2085], [1185, 1915]]);
					}
				}
			}
			color(c = [0.1000000000, 0.1000000000, 0.1000000000]) {
				translate(v = [0, 0, 1490.0000000000]) {
					linear_extrude(height = 686.1000000000) {
						polygon(paths = [[0, 1, 2, 3]], points = [[1435, 1915], [1435, 2085], [1605, 2085], [1605, 1915]]);
					}
				}
			}
			color(c = [0.1000000000, 0.1000000000, 0.1000000000]) {
				translate(v = [0, 0, 1490.0000000000]) {
					linear_extrude(height = 686.1000000000) {
						polygon(paths = [[0, 1, 2, 3]], points = [[1855, 1915], [1855, 2085], [2025, 2085], [2025, 1915]]);
					}
				}
			}
			color(c = [0.1000000000, 0.1000000000, 0.1000000000]) {
				translate(v = [0, 0, 1490.0000000000]) {
					linear_extrude(height = 686.1000000000) {
						polygon(paths = [[0, 1, 2, 3]], points = [[175, 2255], [175, 2425], [345, 2425], [345, 2255]]);
					}
				}
			}
			color(c = [0.1000000000, 0.1000000000, 0.1000000000]) {
				translate(v = [0, 0, 1490.0000000000]) {
					linear_extrude(height = 686.1000000000) {
						polygon(paths = [[0, 1, 2, 3]], points = [[595, 2255], [595, 2425], [765, 2425], [765, 2255]]);
					}
				}
			}
			color(c = [0.1000000000, 0.1000000000, 0.1000000000]) {
				translate(v = [0, 0, 1490.0000000000]) {
					linear_extrude(height = 686.1000000000) {
						polygon(paths = [[0, 1, 2, 3]], points = [[1015, 2255], [1015, 2425], [1185, 2425], [1185, 2255]]);
					}
				}
			}
			color(c = [0.1000000000, 0.1000000000, 0.1000000000]) {
				translate(v = [0, 0, 1490.0000000000]) {
					linear_extrude(height = 686.1000000000) {
						polygon(paths = [[0, 1, 2, 3]], points = [[1435, 2255], [1435, 2425], [1605, 2425], [1605, 2255]]);
					}
				}
			}
			color(c = [0.1000000000, 0.1000000000, 0.1000000000]) {
				translate(v = [0, 0, 1490.0000000000]) {
					linear_extrude(height = 686.1000000000) {
						polygon(paths = [[0, 1, 2, 3]], points = [[1855, 2255], [1855, 2425], [2025, 2425], [2025, 2255]]);
					}
				}
			}
			color(c = [0.9000000000, 0.6000000000, 0.6000000000]) {
				translate(v = [0, 0, 2176.1000000000]) {
					linear_extrude(height = 100.0000000000) {
						polygon(paths = [[0, 1, 2, 3, 4, 5, 6, 7]], points = [[0, -85], [0, 85], [595, 85], [595, 545], [765, 545], [765, 85], [2300, 85], [2300, -85]]);
					}
				}
			}
			color(c = [0.9000000000, 0.6000000000, 0.6000000000]) {
				translate(v = [0, 0, 2176.1000000000]) {
					linear_extrude(height = 100.0000000000) {
						polygon(paths = [[0, 1, 2, 3, 4, 5, 6, 7, 8, 9, 10, 11]], points = [[85, 255], [85, 885], [1185, 885], [1185, 465], [1775, 465], [1775, 485], [2105, 485], [2105, 255], [935, 255], [935, 715], [425, 715], [425, 255]]);
					}
				}
			}
			color(c = [0.9000000000, 0.6000000000, 0.6000000000]) {
				translate(v = [0, 0, 2176.1000000000]) {
					linear_extrude(height = 100.0000000000) {
						polygon(paths = [[0, 1, 2, 3]], points = [[85, 1075], [85, 1325], [845, 1325], [845, 1075]]);
					}
				}
			}
			color(c = [0.9000000000, 0.6000000000, 0.6000000000]) {
				translate(v = [0, 0, 2176.1000000000]) {
					linear_extrude(height = 100.0000000000) {
						polygon(paths = [[0, 1, 2, 3]], points = [[1015, 1075], [1015, 1325], [1765, 1325], [1765, 1075]]);
					}
				}
			}
			color(c = [0.9000000000, 0.6000000000, 0.6000000000]) {
				translate(v = [0, 0, 2176.1000000000]) {
					linear_extrude(height = 100.0000000000) {
						polygon(paths = [[0, 1, 2, 3, 4, 5, 6, 7, 8, 9, 10, 11, 12, 13]], points = [[1355, 655], [1355, 905], [1935, 905], [1935, 1495], [515, 1495], [515, 2465], [845, 2465], [845, 1665], [1355, 1665], [1355, 2465], [1685, 2465], [1685, 1665], [2215, 1665], [2215, 655]]);
					}
				}
			}
			color(c = [0.9000000000, 0.6000000000, 0.6000000000]) {
				translate(v = [0, 0, 2176.1000000000]) {
					linear_extrude(height = 100.0000000000) {
						polygon(paths = [[0, 1, 2, 3, 4, 5, 6, 7, 8, 9, 10, 11, 12, 13, 14, 15]], points = [[85, 1495], [85, 2635], [0, 2635], [0, 2805], [2300, 2805], [2300, 2635], [2110, 2635], [2110, 1835], [1855, 1835], [1855, 2635], [1185, 2635], [1185, 1835], [1015, 1835], [1015, 2635], [345, 2635], [345, 1495]]);
					}
				}
			}
			color(c = [0.5000000000, 0.5000000000, 0.5000000000]) {
				translate(v = [0, 0, 2276.1000000000]) {
					linear_extrude(height = 340.0000000000) {
						polygon(paths = [[0, 1, 2, 3]], points = [[145, -85], [145, 85], [315, 85], [315, -85]]);
					}
				}
			}
			color(c = [0.5000000000, 0.5000000000, 0.5000000000]) {
				translate(v = [0, 0, 2276.1000000000]) {
					linear_extrude(height = 340.0000000000) {
						polygon(paths = [[0, 1, 2, 3]], points = [[605, -85], [605, 85], [775, 85], [775, -85]]);
					}
				}
			}
			color(c = [0.5000000000, 0.5000000000, 0.5000000000]) {
				translate(v = [0, 0, 2276.1000000000]) {
					linear_extrude(height = 340.0000000000) {
						polygon(paths = [[0, 1, 2, 3]], points = [[1065, -85], [1065, 85], [1235, 85], [1235, -85]]);
					}
				}
			}
			color(c = [0.5000000000, 0.5000000000, 0.5000000000]) {
				translate(v = [0, 0, 2276.1000000000]) {
					linear_extrude(height = 340.0000000000) {
						polygon(paths = [[0, 1, 2, 3]], points = [[1525, -85], [1525, 85], [1695, 85], [1695, -85]]);
					}
				}
			}
			color(c = [0.5000000000, 0.5000000000, 0.5000000000]) {
				translate(v = [0, 0, 2276.1000000000]) {
					linear_extrude(height = 340.0000000000) {
						polygon(paths = [[0, 1, 2, 3]], points = [[1985, -85], [1985, 85], [2155, 85], [2155, -85]]);
					}
				}
			}
			color(c = [0.5000000000, 0.5000000000, 0.5000000000]) {
				translate(v = [0, 0, 2276.1000000000]) {
					linear_extrude(height = 340.0000000000) {
						polygon(paths = [[0, 1, 2, 3]], points = [[145, 2635], [145, 2805], [315, 2805], [315, 2635]]);
					}
				}
			}
			color(c = [0.5000000000, 0.5000000000, 0.5000000000]) {
				translate(v = [0, 0, 2276.1000000000]) {
					linear_extrude(height = 340.0000000000) {
						polygon(paths = [[0, 1, 2, 3]], points = [[605, 2635], [605, 2805], [775, 2805], [775, 2635]]);
					}
				}
			}
			color(c = [0.5000000000, 0.5000000000, 0.5000000000]) {
				translate(v = [0, 0, 2276.1000000000]) {
					linear_extrude(height = 340.0000000000) {
						polygon(paths = [[0, 1, 2, 3]], points = [[1065, 2635], [1065, 2805], [1235, 2805], [1235, 2635]]);
					}
				}
			}
			color(c = [0.5000000000, 0.5000000000, 0.5000000000]) {
				translate(v = [0, 0, 2276.1000000000]) {
					linear_extrude(height = 340.0000000000) {
						polygon(paths = [[0, 1, 2, 3]], points = [[1525, 2635], [1525, 2805], [1695, 2805], [1695, 2635]]);
					}
				}
			}
			color(c = [0.5000000000, 0.5000000000, 0.5000000000]) {
				translate(v = [0, 0, 2276.1000000000]) {
					linear_extrude(height = 340.0000000000) {
						polygon(paths = [[0, 1, 2, 3]], points = [[1985, 2635], [1985, 2805], [2155, 2805], [2155, 2635]]);
					}
				}
			}
			color(c = [0.3000000000, 0.3000000000, 1]) {
				translate(v = [0, 0, 2616.1000000000]) {
					linear_extrude(height = 360.0000000000) {
						polygon(paths = [[0, 1, 2, 3]], points = [[0, -240], [0, 240], [2300, 240], [2300, -240]]);
					}
				}
			}
			color(c = [0.3000000000, 0.3000000000, 1]) {
				translate(v = [0, 0, 2616.1000000000]) {
					linear_extrude(height = 360.0000000000) {
						polygon(paths = [[0, 1, 2, 3]], points = [[0, 2480], [0, 2960], [2300, 2960], [2300, 2480]]);
					}
				}
			}
		}
	}
}
